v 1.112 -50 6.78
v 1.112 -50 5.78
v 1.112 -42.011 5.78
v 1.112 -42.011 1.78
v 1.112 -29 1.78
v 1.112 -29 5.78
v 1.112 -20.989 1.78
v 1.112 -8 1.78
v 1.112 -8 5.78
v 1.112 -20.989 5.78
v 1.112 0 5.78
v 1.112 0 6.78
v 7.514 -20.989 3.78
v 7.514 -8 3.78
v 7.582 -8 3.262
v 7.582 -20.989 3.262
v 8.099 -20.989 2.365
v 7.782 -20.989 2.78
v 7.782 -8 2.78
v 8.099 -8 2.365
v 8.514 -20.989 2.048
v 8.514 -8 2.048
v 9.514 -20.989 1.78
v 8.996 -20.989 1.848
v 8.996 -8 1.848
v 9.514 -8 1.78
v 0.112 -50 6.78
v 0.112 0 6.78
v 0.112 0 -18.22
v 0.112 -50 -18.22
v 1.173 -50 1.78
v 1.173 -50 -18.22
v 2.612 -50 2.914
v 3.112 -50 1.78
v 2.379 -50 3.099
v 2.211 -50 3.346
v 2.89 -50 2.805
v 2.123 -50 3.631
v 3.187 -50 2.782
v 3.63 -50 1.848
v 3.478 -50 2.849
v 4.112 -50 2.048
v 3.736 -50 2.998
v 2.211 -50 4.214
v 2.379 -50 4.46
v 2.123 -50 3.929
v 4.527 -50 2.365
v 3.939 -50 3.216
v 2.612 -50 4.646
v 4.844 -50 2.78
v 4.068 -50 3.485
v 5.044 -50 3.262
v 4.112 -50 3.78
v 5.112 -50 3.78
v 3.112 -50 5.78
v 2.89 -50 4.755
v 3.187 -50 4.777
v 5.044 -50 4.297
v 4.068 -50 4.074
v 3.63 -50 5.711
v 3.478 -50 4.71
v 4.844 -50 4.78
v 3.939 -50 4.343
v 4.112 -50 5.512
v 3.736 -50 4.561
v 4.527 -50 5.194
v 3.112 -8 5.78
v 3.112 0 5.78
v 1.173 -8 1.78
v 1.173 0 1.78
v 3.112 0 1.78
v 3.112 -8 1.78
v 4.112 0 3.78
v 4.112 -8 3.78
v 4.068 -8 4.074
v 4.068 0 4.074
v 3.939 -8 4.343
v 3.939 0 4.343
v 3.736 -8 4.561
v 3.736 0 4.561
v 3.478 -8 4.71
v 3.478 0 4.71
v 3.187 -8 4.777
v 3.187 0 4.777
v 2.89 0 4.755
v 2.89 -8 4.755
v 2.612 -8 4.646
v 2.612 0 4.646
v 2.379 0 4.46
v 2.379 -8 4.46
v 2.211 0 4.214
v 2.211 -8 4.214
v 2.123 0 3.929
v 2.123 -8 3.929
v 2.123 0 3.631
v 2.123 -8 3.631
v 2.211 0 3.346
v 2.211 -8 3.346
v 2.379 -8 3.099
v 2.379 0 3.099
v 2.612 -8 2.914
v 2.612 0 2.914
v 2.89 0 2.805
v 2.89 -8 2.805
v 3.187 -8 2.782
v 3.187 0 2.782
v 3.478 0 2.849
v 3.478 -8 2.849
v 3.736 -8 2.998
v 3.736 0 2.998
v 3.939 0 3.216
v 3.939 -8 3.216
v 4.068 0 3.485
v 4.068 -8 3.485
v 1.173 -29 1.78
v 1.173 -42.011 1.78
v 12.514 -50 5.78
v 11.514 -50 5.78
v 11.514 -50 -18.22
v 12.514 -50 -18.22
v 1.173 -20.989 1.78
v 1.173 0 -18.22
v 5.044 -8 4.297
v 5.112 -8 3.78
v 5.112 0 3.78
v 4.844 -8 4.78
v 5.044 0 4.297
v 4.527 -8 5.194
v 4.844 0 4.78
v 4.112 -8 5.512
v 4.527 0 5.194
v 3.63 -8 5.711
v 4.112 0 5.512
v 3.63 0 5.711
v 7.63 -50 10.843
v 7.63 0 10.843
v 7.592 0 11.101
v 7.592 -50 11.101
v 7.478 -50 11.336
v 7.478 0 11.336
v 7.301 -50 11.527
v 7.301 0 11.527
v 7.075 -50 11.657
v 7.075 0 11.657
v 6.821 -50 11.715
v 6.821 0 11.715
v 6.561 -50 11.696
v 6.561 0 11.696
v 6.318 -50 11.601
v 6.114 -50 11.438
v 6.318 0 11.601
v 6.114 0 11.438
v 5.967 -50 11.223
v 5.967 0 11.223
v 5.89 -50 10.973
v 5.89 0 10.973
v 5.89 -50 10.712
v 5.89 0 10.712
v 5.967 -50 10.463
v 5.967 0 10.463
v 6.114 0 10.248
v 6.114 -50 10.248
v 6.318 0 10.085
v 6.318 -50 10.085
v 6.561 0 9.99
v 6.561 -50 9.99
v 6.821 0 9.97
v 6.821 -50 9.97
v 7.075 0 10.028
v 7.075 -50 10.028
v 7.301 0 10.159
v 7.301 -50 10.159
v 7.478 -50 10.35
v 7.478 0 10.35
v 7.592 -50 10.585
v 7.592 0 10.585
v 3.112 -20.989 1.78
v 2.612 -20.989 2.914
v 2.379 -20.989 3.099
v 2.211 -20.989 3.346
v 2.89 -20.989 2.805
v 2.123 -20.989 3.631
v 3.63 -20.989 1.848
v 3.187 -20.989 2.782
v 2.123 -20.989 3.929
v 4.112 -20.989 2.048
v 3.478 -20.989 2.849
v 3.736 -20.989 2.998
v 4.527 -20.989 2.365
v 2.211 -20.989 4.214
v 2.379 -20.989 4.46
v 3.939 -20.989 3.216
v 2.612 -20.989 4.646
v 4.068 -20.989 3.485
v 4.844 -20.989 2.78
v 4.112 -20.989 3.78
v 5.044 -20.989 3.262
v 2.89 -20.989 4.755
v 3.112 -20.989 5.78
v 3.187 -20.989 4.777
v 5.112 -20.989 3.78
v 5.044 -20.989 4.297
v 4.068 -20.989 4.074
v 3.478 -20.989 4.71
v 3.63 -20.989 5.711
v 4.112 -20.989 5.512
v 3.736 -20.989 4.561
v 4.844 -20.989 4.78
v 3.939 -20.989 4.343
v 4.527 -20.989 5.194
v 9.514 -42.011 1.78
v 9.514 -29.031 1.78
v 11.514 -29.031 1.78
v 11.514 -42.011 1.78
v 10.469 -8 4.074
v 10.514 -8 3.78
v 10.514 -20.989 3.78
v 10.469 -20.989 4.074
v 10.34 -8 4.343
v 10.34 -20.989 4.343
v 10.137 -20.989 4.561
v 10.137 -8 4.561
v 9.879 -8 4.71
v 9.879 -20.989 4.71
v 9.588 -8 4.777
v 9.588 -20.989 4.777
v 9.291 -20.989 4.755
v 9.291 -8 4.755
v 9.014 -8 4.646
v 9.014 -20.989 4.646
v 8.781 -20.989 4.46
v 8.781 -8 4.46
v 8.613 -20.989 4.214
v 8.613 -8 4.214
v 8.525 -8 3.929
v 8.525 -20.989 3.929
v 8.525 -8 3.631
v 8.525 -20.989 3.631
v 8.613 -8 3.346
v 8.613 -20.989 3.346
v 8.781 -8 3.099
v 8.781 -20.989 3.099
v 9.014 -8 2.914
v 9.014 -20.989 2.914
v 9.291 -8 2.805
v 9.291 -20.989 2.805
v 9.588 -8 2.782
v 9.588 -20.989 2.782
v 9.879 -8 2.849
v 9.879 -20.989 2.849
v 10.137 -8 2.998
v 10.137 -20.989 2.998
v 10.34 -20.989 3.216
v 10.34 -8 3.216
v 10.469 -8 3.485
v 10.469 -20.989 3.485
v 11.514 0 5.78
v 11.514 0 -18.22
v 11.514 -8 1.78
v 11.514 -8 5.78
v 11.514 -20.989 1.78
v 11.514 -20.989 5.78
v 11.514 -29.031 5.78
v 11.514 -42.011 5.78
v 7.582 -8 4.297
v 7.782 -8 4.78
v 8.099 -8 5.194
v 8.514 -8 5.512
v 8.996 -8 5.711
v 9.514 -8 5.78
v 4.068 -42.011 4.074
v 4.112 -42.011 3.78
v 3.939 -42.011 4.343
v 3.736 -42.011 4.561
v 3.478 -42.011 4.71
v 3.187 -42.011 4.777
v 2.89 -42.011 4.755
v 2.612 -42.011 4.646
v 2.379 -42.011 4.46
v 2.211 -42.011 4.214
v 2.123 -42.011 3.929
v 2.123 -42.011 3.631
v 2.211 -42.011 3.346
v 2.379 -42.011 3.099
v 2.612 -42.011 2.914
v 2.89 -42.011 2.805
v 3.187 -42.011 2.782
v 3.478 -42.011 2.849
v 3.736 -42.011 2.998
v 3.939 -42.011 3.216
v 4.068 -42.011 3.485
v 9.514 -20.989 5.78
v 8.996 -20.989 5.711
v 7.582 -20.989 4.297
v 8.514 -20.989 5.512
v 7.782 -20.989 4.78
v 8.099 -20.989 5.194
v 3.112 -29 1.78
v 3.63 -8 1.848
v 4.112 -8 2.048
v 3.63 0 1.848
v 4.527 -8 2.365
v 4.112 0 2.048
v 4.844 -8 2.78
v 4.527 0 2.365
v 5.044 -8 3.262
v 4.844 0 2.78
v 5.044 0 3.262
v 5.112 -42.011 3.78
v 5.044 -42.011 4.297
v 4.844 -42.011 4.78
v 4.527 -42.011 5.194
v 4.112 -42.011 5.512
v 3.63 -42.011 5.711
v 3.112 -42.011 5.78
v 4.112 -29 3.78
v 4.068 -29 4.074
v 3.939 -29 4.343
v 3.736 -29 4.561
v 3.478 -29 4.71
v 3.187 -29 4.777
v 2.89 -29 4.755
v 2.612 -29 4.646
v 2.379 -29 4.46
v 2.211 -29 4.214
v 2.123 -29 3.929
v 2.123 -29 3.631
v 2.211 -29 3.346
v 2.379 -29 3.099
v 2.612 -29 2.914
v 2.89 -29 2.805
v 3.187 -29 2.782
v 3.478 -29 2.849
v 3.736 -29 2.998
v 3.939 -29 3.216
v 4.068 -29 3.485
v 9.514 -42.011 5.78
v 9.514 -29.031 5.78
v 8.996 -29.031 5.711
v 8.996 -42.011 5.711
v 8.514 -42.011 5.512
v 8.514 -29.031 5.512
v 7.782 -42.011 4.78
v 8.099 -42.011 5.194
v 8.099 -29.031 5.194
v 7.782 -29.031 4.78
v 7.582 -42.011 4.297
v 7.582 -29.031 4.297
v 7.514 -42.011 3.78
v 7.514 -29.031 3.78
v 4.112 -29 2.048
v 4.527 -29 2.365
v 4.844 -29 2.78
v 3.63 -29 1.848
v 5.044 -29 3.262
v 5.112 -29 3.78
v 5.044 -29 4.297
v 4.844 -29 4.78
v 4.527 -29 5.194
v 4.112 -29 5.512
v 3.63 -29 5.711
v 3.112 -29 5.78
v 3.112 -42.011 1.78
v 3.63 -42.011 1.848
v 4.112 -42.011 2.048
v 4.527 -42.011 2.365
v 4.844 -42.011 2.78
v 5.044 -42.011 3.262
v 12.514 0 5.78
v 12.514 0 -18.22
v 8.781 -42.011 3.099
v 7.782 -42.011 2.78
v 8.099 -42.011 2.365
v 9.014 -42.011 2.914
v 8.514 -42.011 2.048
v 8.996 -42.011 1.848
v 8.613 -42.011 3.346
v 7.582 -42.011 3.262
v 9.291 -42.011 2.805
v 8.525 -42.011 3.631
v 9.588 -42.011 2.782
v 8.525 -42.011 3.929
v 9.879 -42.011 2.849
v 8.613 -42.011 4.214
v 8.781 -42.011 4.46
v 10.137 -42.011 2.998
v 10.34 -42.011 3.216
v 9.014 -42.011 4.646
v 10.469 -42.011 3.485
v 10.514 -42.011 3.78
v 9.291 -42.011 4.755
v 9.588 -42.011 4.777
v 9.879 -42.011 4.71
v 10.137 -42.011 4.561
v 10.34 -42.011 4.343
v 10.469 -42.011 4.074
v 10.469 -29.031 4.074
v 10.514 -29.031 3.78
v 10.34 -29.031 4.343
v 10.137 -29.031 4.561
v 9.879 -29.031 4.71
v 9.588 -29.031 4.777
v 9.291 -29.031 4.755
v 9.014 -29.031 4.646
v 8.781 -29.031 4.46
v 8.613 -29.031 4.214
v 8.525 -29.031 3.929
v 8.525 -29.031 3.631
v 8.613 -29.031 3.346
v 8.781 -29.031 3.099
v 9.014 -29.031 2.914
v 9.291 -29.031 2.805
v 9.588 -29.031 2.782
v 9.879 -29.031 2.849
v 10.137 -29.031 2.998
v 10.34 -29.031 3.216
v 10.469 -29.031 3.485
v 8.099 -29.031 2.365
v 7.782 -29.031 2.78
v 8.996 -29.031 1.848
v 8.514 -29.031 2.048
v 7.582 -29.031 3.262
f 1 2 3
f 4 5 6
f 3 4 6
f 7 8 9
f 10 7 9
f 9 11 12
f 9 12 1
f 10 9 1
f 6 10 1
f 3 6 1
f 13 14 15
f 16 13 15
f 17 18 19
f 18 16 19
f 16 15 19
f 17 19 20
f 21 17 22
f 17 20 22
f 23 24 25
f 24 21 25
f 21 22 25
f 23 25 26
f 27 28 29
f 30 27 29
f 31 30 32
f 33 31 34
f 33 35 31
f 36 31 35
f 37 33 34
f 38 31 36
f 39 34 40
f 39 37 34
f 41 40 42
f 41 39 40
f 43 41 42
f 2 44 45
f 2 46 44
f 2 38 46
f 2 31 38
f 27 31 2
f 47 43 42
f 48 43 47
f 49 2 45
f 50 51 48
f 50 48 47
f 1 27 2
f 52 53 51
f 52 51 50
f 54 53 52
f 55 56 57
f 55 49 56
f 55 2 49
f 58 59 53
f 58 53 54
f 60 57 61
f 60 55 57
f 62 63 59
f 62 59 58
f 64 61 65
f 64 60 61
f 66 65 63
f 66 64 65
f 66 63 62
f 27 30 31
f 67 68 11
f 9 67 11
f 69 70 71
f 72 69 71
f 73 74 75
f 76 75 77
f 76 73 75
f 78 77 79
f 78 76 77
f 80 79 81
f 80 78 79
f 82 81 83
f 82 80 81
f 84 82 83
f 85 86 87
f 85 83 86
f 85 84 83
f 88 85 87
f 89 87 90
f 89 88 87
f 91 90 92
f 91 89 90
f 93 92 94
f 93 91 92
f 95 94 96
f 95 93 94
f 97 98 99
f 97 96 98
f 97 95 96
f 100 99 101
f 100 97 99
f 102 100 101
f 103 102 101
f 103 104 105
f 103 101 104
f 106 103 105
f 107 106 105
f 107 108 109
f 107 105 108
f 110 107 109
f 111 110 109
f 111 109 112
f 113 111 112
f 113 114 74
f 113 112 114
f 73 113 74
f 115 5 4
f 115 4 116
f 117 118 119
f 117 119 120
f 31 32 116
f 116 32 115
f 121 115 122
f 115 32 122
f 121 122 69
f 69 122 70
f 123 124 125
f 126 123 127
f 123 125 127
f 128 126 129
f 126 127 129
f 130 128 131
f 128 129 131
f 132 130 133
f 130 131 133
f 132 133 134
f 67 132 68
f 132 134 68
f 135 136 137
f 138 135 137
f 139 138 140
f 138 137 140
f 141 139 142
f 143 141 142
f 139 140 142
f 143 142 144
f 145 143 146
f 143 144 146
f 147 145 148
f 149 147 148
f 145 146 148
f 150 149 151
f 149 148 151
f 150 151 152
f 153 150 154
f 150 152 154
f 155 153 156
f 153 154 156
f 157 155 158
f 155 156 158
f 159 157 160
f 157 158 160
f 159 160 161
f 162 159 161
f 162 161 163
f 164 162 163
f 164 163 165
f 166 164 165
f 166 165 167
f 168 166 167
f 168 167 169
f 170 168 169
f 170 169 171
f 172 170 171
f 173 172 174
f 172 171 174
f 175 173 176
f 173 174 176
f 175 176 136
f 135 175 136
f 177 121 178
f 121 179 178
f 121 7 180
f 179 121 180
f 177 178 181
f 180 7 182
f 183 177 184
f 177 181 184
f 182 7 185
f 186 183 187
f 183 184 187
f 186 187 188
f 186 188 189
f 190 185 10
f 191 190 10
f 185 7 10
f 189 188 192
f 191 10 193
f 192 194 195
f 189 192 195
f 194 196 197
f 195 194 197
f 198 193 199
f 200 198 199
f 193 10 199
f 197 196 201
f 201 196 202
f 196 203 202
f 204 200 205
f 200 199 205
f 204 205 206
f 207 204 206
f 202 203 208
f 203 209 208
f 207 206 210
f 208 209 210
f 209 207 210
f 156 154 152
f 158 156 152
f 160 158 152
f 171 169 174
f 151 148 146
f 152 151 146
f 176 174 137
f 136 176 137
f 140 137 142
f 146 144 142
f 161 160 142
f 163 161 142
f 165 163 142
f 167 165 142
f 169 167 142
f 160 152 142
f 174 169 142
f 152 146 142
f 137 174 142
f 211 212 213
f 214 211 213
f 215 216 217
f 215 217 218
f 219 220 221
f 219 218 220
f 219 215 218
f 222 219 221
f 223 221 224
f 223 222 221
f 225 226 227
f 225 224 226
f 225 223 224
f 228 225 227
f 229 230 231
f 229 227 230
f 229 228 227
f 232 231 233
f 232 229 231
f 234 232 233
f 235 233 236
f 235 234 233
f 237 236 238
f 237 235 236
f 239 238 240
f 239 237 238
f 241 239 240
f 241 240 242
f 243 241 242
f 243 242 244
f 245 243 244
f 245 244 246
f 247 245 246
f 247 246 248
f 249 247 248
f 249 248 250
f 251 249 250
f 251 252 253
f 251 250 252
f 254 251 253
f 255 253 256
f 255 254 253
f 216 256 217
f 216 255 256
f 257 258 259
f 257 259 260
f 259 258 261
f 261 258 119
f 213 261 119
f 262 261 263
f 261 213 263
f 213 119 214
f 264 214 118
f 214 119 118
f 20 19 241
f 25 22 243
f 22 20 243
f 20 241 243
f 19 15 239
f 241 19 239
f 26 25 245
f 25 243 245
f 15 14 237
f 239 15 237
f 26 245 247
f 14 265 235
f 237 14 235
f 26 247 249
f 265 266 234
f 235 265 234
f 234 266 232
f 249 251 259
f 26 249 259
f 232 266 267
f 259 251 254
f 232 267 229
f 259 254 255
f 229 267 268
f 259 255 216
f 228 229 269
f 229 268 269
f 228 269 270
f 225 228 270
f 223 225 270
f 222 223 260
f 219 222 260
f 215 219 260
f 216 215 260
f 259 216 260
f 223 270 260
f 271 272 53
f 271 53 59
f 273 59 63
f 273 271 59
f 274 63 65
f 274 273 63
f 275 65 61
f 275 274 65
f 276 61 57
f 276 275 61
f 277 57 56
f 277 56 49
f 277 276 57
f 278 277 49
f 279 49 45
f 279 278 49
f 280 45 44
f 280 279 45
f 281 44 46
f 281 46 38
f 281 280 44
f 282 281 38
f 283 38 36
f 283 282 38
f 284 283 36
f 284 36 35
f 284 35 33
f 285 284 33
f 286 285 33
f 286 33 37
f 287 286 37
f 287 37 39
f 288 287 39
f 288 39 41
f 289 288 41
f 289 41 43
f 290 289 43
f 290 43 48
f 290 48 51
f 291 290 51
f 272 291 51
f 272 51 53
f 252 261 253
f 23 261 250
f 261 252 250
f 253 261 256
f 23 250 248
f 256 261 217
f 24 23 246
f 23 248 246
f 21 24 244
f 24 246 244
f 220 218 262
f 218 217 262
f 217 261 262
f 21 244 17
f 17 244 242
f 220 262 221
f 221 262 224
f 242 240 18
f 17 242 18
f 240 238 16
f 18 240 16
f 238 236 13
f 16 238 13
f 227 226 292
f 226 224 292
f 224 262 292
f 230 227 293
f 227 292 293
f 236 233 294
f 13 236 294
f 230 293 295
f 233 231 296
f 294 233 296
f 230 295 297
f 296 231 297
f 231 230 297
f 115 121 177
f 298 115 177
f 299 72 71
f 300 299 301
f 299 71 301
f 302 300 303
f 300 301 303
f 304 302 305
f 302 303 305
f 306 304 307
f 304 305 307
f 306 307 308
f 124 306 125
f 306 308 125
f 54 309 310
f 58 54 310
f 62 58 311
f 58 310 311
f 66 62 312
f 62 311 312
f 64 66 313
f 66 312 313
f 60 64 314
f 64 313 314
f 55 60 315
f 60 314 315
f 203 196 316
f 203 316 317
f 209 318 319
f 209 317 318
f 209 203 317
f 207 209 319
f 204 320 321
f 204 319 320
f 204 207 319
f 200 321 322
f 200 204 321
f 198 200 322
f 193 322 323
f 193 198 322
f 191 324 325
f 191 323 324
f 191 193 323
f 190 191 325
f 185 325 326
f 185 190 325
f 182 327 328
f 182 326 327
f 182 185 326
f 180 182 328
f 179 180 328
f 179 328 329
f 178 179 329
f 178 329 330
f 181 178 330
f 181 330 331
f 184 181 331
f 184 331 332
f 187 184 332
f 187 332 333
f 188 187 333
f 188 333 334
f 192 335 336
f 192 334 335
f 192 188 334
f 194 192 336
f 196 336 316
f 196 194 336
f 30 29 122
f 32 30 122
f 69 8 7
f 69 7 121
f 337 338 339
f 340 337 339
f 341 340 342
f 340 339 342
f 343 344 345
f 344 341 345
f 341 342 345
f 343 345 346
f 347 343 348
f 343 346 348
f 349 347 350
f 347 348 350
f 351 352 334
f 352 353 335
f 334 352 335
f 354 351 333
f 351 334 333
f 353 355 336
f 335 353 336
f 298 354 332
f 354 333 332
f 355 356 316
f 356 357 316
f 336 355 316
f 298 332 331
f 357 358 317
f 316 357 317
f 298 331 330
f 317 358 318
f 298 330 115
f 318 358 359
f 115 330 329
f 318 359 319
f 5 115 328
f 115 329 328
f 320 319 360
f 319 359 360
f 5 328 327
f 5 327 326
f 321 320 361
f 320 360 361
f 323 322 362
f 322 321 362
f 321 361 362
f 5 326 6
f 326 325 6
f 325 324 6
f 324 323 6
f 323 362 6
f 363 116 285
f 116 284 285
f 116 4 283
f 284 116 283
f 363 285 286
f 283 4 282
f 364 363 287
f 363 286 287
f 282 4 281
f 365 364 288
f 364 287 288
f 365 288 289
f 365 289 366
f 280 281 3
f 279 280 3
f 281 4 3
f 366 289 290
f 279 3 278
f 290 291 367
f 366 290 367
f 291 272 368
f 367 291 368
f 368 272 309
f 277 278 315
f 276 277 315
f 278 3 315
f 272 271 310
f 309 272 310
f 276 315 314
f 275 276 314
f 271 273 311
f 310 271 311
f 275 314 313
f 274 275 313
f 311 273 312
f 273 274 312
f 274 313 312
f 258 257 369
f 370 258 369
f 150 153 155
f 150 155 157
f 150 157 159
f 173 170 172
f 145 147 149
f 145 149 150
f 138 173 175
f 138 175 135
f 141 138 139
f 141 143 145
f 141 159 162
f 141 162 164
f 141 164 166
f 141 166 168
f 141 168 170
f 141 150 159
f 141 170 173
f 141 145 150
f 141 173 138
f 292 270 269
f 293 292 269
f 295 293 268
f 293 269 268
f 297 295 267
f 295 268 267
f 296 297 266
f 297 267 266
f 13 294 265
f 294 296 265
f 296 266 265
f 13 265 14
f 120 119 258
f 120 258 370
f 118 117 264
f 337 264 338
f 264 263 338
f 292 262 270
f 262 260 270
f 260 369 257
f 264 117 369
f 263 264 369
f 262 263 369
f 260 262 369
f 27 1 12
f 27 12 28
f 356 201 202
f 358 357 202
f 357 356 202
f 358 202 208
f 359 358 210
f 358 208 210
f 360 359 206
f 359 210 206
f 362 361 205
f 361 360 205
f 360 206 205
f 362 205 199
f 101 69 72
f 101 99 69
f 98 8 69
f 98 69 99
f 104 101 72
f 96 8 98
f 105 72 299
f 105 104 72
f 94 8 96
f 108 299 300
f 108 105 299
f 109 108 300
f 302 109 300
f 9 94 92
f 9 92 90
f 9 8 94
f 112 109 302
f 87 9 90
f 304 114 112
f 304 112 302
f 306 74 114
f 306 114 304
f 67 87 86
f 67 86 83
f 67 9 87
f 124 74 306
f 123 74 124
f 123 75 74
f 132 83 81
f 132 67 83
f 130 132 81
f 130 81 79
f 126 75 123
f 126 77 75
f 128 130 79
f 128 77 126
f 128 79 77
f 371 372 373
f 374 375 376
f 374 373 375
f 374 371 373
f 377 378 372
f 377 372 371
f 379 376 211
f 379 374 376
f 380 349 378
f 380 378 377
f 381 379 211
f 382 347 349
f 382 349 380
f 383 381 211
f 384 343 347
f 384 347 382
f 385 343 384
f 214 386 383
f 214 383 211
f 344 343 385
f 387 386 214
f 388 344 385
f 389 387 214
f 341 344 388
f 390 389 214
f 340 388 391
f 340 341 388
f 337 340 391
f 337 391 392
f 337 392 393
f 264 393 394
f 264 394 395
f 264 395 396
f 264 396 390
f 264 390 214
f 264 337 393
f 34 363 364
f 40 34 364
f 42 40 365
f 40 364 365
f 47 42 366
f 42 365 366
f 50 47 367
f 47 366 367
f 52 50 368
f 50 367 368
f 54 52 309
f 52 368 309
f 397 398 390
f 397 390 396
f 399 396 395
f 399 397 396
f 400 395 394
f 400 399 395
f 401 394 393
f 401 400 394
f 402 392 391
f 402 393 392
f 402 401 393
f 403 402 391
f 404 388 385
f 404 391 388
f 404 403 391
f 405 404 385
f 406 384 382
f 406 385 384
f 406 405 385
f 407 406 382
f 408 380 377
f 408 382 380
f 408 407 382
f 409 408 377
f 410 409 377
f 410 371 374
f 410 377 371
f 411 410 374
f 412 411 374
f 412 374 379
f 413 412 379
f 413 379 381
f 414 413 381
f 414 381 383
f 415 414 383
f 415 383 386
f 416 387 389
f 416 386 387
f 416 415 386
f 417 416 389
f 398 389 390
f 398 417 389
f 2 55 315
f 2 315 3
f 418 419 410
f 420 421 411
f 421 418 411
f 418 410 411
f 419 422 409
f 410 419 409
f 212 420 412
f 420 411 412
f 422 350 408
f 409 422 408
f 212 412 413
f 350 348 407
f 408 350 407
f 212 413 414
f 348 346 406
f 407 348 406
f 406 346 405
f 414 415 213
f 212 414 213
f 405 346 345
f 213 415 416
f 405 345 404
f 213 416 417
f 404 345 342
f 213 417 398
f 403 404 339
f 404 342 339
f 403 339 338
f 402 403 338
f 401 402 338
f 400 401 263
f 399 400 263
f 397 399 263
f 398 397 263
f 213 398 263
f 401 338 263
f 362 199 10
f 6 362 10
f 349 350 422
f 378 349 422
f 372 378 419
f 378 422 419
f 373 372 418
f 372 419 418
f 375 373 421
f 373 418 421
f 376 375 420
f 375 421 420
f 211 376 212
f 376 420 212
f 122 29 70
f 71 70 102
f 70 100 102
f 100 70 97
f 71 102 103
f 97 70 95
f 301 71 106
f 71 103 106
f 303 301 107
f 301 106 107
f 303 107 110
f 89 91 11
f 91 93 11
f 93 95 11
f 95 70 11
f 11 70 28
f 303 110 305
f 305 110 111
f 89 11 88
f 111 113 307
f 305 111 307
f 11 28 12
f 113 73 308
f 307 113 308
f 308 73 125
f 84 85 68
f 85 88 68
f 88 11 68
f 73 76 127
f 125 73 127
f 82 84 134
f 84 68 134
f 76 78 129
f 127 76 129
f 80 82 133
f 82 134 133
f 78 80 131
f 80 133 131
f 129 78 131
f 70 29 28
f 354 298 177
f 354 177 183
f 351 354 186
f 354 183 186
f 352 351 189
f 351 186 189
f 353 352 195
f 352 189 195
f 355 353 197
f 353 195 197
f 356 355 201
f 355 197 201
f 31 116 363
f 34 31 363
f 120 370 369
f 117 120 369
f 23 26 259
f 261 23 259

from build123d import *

# Parameters (mm, degrees)
F0_R     = 1
F1_DEPTH = 50
F3_W     = 5.122395698
F3_H     = 8
F3_W_2   = 5.3539113016
F3_H_2   = 12.9889300168
F3_H_3   = 8.1063993275
F4_DEPTH = 5
F5_R     = 0.875
F6_DEPTH = 50
F7_W     = 1
F7_H     = 4
F8_DEPTH = 50


with BuildPart() as f1:
    # F0 (on Front) → F1 (new body)
    with BuildSketch(Plane.XZ):
        Polygon((11.5136448294, 1.7796257744), (11.5136448294, -18.2203742256), (12.5136448294, -18.2203742256), (12.5136448294, 5.7796257744), (11.5136448294, 5.7796257744), (11.5136448294, 5.7715522125), align=None)
        with BuildLine():
            Line((9.5136448294, 1.7796257744), (11.5136448294, 1.7796257744))
            Line((11.5136448294, 1.7796257744), (11.5136448294, 5.7715522125))
            Line((11.5136448294, 5.7715522125), (11.5136448294, 5.7796257744))
            Line((11.5136448294, 5.7796257744), (9.5136448294, 5.7796257744))
            ThreePointArc((9.5136448294, 5.7796257744), (8.099431267, 5.1938393367), (7.5136448294, 3.7796257744))
            ThreePointArc((7.5136448294, 3.7796257744), (8.099431267, 2.365412212), (9.5136448294, 1.7796257744))
        make_face()
        with Locations((9.5136448294, 3.7796257744)):
            Circle(F0_R, mode=Mode.SUBTRACT)
    extrude(amount=F1_DEPTH)


with BuildPart() as f1b:
    # F0 (on Front) → F1, piece 2 (new body)
    with BuildSketch(Plane.XZ):
        with BuildLine():
            Line((18.6969495416, 5.7796257744), (18.6969495416, 6.7796257744))
            Line((18.6969495416, 6.7796257744), (17.6969495416, 6.7796257744))
            Line((17.6969495416, 6.7796257744), (17.6969495416, -18.2203742256))
            Line((17.6969495416, -18.2203742256), (18.7577743009, -18.2203742256))
            Line((18.7577743009, -18.2203742256), (18.7577743009, 1.7796257744))
            Line((18.7577743009, 1.7796257744), (20.6969495416, 1.7796257744))
            ThreePointArc((20.6969495416, 1.7796257744), (22.1111631039, 2.365412212), (22.6969495416, 3.7796257744))
            ThreePointArc((22.6969495416, 3.7796257744), (22.1111631039, 5.1938393367), (20.6969495416, 5.7796257744))
            Line((20.6969495416, 5.7796257744), (19.6969495416, 5.7796257744))
            Line((19.6969495416, 5.7796257744), (18.6969495416, 5.7796257744))
        make_face()
        with Locations((20.6969495416, 3.7796257744)):
            Circle(F0_R, mode=Mode.SUBTRACT)
    extrude(amount=F1_DEPTH)


with BuildPart() as f1b_1:
    # F2: moved
    add(f1b.part.moved(Location((-17.58463, 0, 0))))


with BuildPart() as f4_tool:
    # F3 (on face) → F4 (new body)
    with BuildSketch(Plane.XY.offset(6.7796257744)):
        with Locations((9.0274286922, -4)):
            Rectangle(F3_W, F3_H)
        with Locations((3.7892751924, -14.4944650084)):
            Rectangle(F3_W_2, F3_H_2)
        with Locations((9.0274286922, -46.0645761341)):
            Rectangle(F3_W, F3_H_3)
        Polygon((11.5886265412, -20.9889300168), (6.4662308432, -20.9889300168), (6.4662308432, -29), (6.4662308432, -29.0307551622), (11.5886265412, -29.0307551622), align=None)
        Polygon((6.4662308432, -29.0307551622), (6.4662308432, -29), (1.1123195416, -29), (1.1123195416, -42.0113764703), (6.4662308432, -42.0113764703), align=None)
    extrude(amount=-F4_DEPTH)


with BuildPart() as f1_1:
    add(f1.part)

    # F4: cut by f4_tool
    add(f4_tool.part, mode=Mode.SUBTRACT)

    # F7 (on face) → F8 (join)
    with BuildSketch(Plane.XZ.offset(50)):
        with Locations((12.0136448294, 3.7796257744)):
            Rectangle(F7_W, F7_H)
    extrude(amount=-F8_DEPTH)


with BuildPart() as f1b_2:
    add(f1b_1.part)

    # F4: cut by f4_tool
    add(f4_tool.part, mode=Mode.SUBTRACT)


with BuildPart() as f6:
    # F5 (on Front) → F6 (new body)
    with BuildSketch(Plane.XZ):
        with Locations((6.7554977722, 10.8428876847)):
            Circle(F5_R)
    extrude(amount=F6_DEPTH)


solid = Compound([f1_1.part, f1b_2.part, f6.part])
